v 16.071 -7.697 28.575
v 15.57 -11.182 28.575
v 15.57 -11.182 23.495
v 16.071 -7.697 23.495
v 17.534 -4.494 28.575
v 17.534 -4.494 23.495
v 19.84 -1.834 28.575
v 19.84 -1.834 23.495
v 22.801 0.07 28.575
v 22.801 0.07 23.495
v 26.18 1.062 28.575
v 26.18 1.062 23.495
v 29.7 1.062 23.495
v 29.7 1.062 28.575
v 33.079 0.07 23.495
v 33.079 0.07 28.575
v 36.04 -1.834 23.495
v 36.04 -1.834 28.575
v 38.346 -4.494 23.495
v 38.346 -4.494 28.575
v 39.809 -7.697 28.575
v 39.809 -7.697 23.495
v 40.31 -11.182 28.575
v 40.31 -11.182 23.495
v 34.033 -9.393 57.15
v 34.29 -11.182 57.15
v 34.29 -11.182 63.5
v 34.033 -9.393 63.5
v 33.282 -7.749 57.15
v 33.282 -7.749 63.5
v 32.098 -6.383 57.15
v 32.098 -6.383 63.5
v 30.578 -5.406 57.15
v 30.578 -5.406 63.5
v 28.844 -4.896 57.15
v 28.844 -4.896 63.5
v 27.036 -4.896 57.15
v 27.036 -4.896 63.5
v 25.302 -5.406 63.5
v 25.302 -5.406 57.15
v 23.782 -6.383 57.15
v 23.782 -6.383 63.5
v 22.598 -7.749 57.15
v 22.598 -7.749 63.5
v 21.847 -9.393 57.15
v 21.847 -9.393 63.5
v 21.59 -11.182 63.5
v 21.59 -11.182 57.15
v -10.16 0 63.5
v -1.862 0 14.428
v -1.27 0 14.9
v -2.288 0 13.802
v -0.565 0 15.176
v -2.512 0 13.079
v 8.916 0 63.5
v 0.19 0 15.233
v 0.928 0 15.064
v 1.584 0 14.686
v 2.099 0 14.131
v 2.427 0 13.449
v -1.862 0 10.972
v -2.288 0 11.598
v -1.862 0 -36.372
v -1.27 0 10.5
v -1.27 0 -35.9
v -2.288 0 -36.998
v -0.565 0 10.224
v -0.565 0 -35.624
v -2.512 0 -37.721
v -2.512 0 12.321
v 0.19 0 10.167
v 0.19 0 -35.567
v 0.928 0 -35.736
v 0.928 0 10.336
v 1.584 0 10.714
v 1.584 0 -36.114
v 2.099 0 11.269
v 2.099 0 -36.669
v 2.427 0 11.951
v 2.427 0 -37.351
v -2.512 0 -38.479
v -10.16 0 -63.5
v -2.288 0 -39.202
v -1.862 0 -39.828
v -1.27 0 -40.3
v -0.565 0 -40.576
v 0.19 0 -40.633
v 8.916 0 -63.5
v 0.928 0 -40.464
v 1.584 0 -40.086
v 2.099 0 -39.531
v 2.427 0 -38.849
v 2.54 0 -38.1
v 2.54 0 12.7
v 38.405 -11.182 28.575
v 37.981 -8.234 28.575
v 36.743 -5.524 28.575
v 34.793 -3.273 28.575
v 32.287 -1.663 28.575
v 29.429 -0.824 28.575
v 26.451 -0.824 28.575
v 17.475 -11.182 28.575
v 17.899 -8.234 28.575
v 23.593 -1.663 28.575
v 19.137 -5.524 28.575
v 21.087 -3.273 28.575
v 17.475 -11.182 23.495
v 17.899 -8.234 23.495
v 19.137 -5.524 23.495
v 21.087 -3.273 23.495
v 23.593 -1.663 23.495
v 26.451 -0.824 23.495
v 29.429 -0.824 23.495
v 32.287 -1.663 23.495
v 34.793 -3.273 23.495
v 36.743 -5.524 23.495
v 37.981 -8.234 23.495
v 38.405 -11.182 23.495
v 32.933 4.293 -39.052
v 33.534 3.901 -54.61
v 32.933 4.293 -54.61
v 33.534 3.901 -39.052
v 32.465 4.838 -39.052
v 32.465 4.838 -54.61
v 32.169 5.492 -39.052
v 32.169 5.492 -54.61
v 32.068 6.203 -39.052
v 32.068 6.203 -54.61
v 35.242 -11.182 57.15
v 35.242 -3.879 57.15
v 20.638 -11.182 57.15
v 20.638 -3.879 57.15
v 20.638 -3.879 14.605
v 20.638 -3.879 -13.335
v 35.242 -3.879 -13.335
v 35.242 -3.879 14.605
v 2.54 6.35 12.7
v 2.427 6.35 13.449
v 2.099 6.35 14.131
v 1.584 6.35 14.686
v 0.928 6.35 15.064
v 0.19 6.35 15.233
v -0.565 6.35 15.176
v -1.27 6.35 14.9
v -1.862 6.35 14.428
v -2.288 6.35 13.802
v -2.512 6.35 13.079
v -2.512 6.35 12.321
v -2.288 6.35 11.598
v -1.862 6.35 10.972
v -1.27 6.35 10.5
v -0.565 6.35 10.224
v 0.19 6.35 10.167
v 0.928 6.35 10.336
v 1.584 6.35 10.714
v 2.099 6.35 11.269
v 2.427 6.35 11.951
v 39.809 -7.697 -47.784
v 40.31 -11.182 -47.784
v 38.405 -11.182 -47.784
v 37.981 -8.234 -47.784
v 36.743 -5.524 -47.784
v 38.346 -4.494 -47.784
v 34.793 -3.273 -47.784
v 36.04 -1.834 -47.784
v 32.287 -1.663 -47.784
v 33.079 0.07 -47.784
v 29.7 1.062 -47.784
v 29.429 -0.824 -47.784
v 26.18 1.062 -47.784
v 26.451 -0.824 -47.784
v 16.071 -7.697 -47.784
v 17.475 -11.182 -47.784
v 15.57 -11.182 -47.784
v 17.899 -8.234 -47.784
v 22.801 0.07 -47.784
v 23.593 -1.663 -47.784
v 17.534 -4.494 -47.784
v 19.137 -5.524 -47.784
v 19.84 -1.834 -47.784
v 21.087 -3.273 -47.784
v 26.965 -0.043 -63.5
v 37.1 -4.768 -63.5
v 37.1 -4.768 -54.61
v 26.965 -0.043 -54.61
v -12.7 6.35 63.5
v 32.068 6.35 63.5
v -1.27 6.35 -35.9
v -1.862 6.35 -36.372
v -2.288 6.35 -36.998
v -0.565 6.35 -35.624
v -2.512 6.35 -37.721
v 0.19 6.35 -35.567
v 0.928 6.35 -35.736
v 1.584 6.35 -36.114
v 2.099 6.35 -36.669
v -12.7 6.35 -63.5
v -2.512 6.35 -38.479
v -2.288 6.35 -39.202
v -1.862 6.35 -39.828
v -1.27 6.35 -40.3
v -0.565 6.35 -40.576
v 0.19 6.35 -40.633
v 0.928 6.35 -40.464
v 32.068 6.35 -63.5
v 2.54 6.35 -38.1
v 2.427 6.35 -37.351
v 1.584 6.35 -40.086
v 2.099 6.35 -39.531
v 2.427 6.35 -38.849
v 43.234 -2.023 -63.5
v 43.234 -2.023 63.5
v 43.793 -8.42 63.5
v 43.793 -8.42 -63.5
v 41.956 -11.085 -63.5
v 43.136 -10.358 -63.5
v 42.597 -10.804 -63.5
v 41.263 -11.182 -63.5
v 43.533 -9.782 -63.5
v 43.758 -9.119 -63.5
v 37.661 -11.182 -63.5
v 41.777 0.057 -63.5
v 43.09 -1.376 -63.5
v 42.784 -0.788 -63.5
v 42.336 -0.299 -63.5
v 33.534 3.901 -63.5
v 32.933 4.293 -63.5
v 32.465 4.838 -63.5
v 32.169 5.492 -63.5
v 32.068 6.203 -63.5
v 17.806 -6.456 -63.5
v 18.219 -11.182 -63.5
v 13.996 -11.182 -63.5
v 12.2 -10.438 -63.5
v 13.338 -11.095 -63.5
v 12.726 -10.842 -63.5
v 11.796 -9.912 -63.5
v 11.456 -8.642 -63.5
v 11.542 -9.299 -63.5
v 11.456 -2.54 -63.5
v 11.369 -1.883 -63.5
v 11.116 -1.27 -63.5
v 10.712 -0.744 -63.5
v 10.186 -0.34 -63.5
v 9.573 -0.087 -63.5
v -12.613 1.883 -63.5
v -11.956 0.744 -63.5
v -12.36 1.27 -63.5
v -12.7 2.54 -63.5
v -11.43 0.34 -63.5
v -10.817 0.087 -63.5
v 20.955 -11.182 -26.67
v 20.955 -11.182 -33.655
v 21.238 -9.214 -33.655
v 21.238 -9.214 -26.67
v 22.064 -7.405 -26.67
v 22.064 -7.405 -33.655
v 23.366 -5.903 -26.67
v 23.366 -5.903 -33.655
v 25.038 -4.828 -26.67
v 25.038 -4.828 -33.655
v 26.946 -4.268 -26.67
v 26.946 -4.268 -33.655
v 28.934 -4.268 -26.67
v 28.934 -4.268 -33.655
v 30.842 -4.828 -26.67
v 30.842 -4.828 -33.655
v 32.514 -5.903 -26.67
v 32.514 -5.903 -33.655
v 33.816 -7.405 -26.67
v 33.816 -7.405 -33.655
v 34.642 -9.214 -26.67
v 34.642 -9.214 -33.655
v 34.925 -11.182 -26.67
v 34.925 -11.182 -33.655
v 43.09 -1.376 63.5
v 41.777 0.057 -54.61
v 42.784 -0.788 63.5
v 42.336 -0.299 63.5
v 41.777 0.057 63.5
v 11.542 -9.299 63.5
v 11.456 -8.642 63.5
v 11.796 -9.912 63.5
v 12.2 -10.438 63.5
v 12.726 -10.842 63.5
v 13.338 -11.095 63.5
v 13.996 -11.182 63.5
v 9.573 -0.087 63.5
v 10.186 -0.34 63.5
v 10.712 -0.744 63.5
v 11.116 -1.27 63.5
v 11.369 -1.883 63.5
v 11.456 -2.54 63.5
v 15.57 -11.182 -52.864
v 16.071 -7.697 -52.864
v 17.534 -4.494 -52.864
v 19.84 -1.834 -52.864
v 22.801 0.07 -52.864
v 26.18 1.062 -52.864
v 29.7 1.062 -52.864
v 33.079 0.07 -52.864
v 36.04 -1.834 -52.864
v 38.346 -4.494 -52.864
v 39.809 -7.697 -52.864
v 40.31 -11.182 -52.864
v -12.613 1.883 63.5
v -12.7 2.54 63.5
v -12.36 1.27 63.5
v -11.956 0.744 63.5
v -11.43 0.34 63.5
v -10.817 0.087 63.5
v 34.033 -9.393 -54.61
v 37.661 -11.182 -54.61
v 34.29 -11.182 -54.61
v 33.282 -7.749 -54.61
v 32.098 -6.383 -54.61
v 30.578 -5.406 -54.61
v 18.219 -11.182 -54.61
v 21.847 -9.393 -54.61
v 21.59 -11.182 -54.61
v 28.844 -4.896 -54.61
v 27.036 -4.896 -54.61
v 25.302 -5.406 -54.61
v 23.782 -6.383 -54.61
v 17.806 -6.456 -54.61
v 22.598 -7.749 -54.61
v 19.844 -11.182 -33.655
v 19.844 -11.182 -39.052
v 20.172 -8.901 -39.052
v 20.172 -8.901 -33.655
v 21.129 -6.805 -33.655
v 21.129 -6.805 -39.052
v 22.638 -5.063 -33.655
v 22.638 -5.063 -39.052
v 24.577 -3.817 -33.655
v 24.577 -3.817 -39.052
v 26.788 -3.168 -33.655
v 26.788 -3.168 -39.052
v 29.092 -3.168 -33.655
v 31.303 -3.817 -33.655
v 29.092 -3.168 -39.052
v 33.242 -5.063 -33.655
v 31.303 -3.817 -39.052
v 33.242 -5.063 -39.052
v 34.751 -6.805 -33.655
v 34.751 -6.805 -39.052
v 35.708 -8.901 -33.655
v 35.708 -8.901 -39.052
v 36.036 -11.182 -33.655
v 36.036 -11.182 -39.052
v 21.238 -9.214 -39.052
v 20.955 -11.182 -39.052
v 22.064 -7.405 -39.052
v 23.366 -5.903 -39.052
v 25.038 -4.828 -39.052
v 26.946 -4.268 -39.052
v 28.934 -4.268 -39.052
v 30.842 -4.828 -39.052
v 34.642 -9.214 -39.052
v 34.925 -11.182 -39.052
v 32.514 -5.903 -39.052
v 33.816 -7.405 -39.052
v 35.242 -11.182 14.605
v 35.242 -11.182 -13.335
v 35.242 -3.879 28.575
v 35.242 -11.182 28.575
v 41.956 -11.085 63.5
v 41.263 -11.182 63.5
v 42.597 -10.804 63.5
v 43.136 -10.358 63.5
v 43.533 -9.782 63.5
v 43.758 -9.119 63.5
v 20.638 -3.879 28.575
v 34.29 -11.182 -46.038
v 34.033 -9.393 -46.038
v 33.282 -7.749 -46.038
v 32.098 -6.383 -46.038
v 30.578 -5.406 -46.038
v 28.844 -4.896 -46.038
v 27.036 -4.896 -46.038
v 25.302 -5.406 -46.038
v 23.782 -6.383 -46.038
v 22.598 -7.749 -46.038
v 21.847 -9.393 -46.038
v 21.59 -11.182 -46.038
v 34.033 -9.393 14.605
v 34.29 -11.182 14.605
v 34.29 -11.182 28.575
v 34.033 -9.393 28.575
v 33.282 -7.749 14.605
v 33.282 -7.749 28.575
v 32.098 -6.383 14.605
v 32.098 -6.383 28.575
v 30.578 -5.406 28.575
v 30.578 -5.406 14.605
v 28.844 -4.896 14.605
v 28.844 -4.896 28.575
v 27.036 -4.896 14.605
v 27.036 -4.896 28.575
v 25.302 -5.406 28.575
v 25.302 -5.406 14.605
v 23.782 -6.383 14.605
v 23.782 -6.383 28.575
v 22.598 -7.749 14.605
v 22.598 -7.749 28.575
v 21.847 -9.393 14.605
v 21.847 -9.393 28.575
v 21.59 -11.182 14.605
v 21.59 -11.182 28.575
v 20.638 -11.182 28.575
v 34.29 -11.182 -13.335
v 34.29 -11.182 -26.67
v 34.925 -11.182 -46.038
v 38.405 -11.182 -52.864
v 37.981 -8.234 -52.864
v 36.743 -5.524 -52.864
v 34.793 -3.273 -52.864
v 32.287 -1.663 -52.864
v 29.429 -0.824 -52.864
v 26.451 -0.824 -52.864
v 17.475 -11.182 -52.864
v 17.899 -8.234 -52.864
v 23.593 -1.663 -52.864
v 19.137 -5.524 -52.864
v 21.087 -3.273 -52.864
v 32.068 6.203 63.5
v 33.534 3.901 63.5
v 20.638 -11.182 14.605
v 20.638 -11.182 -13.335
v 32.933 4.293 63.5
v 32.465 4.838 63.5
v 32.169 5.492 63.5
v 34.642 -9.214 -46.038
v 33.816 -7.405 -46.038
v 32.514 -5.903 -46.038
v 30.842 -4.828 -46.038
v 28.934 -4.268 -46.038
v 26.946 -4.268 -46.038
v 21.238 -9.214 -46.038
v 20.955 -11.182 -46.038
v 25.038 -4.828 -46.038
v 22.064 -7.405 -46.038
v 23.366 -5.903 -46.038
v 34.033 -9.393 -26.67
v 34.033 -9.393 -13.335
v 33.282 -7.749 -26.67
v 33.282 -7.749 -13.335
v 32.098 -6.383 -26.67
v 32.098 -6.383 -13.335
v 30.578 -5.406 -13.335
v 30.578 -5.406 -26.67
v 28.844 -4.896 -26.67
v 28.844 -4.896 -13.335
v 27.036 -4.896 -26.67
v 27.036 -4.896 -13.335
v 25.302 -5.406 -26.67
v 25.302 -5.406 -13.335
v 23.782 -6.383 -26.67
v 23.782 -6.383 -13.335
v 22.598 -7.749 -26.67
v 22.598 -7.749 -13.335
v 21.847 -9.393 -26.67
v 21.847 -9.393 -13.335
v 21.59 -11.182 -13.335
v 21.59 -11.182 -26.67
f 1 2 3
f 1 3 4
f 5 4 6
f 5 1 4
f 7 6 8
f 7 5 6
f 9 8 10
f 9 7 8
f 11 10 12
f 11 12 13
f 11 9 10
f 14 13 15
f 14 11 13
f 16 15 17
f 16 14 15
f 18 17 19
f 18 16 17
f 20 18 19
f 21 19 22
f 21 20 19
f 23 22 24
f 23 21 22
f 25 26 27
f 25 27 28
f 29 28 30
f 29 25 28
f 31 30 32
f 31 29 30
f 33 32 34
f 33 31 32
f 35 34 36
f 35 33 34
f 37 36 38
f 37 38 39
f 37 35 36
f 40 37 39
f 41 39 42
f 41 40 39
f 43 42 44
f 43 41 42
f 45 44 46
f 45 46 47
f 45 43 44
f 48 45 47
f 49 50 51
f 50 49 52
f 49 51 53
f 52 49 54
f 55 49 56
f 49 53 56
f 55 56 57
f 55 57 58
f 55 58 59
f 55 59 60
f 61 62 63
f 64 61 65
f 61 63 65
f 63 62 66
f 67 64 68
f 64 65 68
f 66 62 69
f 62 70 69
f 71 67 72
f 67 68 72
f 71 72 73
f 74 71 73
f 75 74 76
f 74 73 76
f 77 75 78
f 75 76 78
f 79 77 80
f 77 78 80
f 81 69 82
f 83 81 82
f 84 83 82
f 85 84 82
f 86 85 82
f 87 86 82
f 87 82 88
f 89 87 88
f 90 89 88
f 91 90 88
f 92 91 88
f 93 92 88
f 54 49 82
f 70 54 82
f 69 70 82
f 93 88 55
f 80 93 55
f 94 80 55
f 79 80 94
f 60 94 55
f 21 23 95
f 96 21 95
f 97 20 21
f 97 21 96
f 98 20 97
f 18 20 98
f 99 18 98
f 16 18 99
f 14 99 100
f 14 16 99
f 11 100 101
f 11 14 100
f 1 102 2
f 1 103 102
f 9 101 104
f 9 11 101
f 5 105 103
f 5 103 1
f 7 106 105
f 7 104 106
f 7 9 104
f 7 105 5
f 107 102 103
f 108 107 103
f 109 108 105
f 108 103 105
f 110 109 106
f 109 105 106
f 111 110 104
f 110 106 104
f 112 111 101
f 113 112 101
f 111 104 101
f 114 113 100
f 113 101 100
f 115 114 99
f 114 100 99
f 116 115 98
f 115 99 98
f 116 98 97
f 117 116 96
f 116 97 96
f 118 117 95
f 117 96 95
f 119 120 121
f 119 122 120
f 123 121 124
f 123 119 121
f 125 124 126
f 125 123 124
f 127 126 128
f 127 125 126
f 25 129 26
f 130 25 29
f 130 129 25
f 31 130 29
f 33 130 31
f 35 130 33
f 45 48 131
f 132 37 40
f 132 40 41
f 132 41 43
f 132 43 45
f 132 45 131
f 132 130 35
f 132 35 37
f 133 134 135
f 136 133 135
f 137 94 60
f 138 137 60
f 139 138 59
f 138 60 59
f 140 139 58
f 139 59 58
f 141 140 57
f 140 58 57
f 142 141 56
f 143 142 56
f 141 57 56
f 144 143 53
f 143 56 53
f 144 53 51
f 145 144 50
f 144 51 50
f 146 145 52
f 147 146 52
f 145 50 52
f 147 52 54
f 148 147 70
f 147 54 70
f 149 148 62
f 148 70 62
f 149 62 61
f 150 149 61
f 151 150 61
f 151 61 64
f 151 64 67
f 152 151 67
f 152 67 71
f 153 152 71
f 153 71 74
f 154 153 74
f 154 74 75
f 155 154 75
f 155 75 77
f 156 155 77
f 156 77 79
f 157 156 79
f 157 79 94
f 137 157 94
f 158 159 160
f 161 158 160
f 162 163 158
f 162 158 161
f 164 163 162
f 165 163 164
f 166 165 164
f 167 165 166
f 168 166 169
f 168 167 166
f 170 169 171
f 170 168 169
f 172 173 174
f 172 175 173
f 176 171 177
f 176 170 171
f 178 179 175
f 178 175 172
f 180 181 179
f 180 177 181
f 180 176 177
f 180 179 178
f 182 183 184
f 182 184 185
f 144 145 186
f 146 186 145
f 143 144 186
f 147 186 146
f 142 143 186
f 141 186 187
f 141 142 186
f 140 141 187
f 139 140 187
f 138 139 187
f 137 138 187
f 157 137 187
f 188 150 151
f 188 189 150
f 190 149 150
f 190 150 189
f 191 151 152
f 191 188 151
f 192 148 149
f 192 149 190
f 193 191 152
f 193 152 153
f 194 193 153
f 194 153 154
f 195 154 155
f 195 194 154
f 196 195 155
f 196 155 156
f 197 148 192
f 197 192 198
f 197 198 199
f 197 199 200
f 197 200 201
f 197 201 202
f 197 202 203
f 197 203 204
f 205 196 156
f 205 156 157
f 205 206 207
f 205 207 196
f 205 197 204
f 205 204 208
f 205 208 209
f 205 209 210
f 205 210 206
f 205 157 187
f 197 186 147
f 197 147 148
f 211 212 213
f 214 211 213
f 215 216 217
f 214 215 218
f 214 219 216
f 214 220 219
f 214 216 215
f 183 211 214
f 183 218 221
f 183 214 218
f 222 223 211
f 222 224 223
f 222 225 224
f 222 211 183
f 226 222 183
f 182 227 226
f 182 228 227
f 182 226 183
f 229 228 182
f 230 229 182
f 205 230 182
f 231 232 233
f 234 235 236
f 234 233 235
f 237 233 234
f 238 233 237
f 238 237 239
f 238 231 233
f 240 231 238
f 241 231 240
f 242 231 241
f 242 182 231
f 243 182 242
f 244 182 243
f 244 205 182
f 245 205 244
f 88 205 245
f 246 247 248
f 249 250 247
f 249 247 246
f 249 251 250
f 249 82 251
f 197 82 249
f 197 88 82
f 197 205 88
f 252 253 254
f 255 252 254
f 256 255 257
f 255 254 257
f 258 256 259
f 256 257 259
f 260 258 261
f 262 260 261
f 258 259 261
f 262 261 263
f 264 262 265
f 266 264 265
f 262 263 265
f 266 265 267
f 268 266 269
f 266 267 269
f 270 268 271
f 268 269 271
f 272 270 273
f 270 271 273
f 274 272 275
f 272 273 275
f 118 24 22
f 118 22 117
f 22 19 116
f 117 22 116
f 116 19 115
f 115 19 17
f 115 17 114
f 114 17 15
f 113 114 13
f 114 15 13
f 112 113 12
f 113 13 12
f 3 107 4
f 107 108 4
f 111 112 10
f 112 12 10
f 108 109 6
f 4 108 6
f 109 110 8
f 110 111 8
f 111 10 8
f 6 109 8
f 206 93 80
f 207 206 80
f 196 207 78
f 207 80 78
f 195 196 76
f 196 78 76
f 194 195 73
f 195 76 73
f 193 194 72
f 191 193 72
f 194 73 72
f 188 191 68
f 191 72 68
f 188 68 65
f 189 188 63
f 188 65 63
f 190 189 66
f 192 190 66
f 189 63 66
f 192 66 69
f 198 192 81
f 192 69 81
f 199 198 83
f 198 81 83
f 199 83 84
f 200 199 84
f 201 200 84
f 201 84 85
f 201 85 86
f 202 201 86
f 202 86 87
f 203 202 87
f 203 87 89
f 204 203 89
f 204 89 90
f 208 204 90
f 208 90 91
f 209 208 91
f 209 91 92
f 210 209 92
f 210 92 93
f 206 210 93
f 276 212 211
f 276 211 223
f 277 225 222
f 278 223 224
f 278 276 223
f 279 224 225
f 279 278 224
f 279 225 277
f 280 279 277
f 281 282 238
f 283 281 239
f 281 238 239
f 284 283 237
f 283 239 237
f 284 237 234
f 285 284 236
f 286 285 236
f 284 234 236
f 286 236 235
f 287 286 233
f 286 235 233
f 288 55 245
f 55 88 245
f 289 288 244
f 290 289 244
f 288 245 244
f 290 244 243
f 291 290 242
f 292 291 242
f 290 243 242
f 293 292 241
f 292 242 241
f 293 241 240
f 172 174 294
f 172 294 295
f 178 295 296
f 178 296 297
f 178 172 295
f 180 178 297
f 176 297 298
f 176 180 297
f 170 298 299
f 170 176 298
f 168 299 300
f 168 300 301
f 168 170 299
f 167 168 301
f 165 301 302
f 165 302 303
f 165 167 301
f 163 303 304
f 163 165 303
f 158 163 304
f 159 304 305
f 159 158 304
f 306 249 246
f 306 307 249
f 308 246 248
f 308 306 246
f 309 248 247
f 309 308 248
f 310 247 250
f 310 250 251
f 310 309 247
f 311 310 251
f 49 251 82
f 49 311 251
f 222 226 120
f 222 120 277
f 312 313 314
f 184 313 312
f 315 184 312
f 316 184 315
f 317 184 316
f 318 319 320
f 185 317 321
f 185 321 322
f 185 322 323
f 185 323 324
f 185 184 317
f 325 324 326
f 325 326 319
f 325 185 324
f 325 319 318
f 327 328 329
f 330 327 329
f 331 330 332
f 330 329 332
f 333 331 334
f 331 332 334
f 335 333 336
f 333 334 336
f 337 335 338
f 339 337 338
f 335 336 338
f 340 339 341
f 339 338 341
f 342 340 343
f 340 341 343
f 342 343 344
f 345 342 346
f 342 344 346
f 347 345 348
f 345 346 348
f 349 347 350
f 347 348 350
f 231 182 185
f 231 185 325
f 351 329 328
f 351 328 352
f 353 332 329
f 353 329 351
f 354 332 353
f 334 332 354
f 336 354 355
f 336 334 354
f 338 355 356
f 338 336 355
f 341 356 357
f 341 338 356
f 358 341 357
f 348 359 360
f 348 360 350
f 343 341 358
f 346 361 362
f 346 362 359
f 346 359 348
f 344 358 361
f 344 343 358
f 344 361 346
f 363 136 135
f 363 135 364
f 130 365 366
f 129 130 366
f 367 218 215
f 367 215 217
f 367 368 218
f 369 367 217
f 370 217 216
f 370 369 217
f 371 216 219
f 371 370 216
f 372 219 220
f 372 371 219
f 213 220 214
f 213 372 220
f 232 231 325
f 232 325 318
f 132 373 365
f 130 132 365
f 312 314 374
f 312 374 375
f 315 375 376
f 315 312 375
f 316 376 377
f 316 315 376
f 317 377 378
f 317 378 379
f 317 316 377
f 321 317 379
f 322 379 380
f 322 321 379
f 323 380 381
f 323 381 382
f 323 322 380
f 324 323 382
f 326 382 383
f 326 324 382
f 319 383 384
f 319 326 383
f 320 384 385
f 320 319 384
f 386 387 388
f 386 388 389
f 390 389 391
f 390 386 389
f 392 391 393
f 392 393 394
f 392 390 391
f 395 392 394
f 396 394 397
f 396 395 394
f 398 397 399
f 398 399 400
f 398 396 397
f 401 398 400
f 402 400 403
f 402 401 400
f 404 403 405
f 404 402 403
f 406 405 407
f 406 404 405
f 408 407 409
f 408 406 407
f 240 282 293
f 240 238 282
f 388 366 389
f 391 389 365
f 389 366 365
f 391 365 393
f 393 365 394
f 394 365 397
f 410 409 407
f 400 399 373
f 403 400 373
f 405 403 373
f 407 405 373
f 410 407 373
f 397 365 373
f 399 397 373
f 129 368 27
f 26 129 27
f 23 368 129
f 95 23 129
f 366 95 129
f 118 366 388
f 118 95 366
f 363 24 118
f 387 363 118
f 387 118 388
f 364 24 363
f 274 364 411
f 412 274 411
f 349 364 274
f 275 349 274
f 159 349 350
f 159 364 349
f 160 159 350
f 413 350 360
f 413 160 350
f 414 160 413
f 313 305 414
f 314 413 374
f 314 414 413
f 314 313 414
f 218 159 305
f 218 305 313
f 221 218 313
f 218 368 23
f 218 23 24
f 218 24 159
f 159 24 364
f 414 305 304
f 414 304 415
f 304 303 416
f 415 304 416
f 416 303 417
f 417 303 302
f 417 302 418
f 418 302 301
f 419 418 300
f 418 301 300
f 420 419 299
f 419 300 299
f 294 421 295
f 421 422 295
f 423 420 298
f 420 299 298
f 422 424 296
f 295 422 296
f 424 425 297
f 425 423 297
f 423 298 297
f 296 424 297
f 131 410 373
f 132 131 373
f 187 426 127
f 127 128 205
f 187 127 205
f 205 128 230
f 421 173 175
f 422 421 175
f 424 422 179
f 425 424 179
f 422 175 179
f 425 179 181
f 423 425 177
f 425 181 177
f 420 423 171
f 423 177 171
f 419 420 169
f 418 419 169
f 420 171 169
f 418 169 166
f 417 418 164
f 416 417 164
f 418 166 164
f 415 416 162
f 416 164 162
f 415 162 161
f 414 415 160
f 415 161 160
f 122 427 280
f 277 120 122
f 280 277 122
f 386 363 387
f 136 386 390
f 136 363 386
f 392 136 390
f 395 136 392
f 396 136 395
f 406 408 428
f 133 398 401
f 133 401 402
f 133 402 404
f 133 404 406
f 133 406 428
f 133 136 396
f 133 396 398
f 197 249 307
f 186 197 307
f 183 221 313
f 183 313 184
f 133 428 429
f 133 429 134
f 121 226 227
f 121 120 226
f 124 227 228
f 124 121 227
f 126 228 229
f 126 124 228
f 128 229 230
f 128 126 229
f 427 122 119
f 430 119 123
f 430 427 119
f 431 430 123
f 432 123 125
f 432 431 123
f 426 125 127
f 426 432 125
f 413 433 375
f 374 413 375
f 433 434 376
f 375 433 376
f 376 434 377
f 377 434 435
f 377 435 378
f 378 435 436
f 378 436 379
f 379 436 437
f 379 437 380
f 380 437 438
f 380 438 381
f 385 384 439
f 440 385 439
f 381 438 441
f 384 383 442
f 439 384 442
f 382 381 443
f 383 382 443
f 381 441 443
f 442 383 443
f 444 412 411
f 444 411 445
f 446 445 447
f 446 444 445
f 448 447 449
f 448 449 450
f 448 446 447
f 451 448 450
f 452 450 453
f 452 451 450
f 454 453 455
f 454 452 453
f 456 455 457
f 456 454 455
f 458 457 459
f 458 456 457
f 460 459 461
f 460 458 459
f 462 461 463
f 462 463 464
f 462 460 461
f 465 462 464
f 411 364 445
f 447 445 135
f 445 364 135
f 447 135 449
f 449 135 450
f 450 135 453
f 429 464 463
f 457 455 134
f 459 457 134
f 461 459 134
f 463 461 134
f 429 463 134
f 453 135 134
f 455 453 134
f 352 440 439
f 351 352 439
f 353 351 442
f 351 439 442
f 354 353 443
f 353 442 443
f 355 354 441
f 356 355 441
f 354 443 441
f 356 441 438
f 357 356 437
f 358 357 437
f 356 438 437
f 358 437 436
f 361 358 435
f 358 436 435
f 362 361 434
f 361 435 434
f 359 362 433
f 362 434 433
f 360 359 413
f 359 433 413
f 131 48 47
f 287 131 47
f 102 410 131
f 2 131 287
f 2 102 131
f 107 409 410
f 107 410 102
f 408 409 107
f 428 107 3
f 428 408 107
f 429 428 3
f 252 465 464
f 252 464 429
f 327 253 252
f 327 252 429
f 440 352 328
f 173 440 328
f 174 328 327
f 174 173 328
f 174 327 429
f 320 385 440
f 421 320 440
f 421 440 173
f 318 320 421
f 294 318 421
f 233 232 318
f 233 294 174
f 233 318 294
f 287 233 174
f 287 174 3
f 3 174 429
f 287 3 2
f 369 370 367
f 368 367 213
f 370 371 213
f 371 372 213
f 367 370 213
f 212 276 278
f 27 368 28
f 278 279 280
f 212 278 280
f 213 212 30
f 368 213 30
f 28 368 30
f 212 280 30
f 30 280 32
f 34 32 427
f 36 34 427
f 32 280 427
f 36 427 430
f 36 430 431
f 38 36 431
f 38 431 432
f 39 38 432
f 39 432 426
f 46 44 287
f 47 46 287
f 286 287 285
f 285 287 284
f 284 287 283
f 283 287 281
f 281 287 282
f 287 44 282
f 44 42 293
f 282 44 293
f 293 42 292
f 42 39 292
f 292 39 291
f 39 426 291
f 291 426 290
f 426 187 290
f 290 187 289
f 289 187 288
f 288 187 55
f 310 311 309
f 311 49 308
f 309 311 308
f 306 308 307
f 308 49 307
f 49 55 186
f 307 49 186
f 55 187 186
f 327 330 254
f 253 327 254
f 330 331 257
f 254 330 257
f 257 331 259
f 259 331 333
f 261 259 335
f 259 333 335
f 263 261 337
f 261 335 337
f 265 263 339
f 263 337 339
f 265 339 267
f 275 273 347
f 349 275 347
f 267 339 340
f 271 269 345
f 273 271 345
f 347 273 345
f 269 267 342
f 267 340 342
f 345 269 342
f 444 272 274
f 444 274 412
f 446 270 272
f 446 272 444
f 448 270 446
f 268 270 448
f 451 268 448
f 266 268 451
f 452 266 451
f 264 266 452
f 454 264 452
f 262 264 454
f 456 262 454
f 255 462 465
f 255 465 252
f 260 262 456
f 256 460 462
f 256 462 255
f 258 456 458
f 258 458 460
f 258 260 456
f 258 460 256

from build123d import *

# Parameters (mm, degrees)
SKETCH1_W            = 64.135
SKETCH1_H            = 127
BOSS_EXTRUDE1_DEPTH  = 6.35
BOSS_EXTRUDE13_DEPTH = 8.89
BOSS_EXTRUDE14_DEPTH = 8.5725
BOSS_EXTRUDE15_DEPTH = 6.985
BOSS_EXTRUDE16_DEPTH = 5.3975
BOSS_EXTRUDE17_START = 12.3825
BOSS_EXTRUDE17_DEPTH = 6.985
BOSS_EXTRUDE18_START = 27.94
BOSS_EXTRUDE18_DEPTH = 13.335
BOSS_EXTRUDE19_DEPTH = 27.94
BOSS_EXTRUDE20_START = 69.215
BOSS_EXTRUDE20_DEPTH = 13.97
BOSS_EXTRUDE21_START = 41.91
BOSS_EXTRUDE21_DEPTH = 28.575
BOSS_EXTRUDE22_START = 111.76
BOSS_EXTRUDE22_DEPTH = 6.35
SKETCH18_R           = 2.54
SKETCH18_W           = 19.3675
SKETCH18_H           = 127
CUT_EXTRUDE5_DEPTH   = 7.35
SKETCH20_W           = 1.905
SKETCH20_H           = 5.08
FILLET3_R            = 2.54


with BuildPart() as part:
    # Sketch1 → Boss-Extrude1 (new body)
    with BuildSketch(Plane(origin=(0, 0, 0), x_dir=(1, 0, 0), z_dir=(0, 1, 0))):
        Rectangle(SKETCH1_W, SKETCH1_H)
    extrude(amount=BOSS_EXTRUDE1_DEPTH)

    # Sketch12 → Boss-Extrude13 (add)
    with BuildSketch(Plane(origin=(0, 0, -63.5), x_dir=(-1, 0, 0), z_dir=(0, 0, -1))):
        Polygon((-37.660740352, -11.181831339), (-37.09962, -4.768196367), (-26.965439184, -0.042550244), (-17.805819185, -6.456185215), (-18.219259648, -11.181831339), (-11.455819185, -11.181831339), (-11.455819185, 6.35), (-28.281950999, 6.35), (-43.105928196, -0.562534091), (-44.03499632, -11.181831339), align=None)
    extrude(amount=-BOSS_EXTRUDE13_DEPTH)

    # Sketch13 → Boss-Extrude14 (add)
    with BuildSketch(Plane.XY.offset(-54.61)):
        with BuildLine():
            Line((44.03499632, -11.181831339), (34.29, -11.181831339))
            ThreePointArc((34.29, -11.181831339), (27.94, -4.831831339), (21.59, -11.181831339))
            Line((21.59, -11.181831339), (11.455819185, -11.181831339))
            Line((11.455819185, -11.181831339), (11.455819185, 0))
            Line((11.455819185, 0), (32.0675, 0))
            Line((32.0675, 0), (32.0675, 4.584769511))
            Line((32.0675, 4.584769511), (43.105928196, -0.562534091))
            Line((43.105928196, -0.562534091), (44.03499632, -11.181831339))
        make_face()
    extrude(amount=BOSS_EXTRUDE14_DEPTH)

    # Sketch14 → Boss-Extrude15 (add)
    with BuildSketch(Plane.XY.offset(-46.0375)):
        with BuildLine():
            Line((34.925, -11.181831339), (44.03499632, -11.181831339))
            Line((44.03499632, -11.181831339), (43.105928196, -0.562534091))
            Line((43.105928196, -0.562534091), (32.0675, 4.584769511))
            Line((32.0675, 4.584769511), (32.0675, 0))
            Line((32.0675, 0), (11.455819185, 0))
            Line((11.455819185, 0), (11.455819185, -11.181831339))
            Line((11.455819185, -11.181831339), (20.955, -11.181831339))
            ThreePointArc((20.955, -11.181831339), (27.94, -4.196831339), (34.925, -11.181831339))
        make_face()
    extrude(amount=BOSS_EXTRUDE15_DEPTH)

    # Sketch15 → Boss-Extrude16 (add)
    with BuildSketch(Plane.XY.offset(-39.0525)):
        with BuildLine():
            Line((36.03625, -11.181831339), (44.03499632, -11.181831339))
            Line((44.03499632, -11.181831339), (43.105928196, -0.562534091))
            Line((43.105928196, -0.562534091), (32.0675, 4.584769511))
            Line((32.0675, 4.584769511), (32.0675, 0))
            Line((32.0675, 0), (11.455819185, 0))
            Line((11.455819185, 0), (11.455819185, -11.181831339))
            Line((11.455819185, -11.181831339), (19.84375, -11.181831339))
            ThreePointArc((19.84375, -11.181831339), (27.94, -3.085581339), (36.03625, -11.181831339))
        make_face()
    extrude(amount=BOSS_EXTRUDE16_DEPTH)

    # Sketch14_2 → Boss-Extrude17 (add)
    with BuildSketch(Plane.XY.offset(-46.0375).offset(BOSS_EXTRUDE17_START)):
        with BuildLine():
            Line((34.925, -11.181831339), (44.03499632, -11.181831339))
            Line((44.03499632, -11.181831339), (43.105928196, -0.562534091))
            Line((43.105928196, -0.562534091), (32.0675, 4.584769511))
            Line((32.0675, 4.584769511), (32.0675, 0))
            Line((32.0675, 0), (11.455819185, 0))
            Line((11.455819185, 0), (11.455819185, -11.181831339))
            Line((11.455819185, -11.181831339), (20.955, -11.181831339))
            ThreePointArc((20.955, -11.181831339), (27.94, -4.196831339), (34.925, -11.181831339))
        make_face()
    extrude(amount=BOSS_EXTRUDE17_DEPTH)

    # Sketch13_2 → Boss-Extrude18 (add)
    with BuildSketch(Plane.XY.offset(-54.61).offset(BOSS_EXTRUDE18_START)):
        with BuildLine():
            Line((44.03499632, -11.181831339), (34.29, -11.181831339))
            ThreePointArc((34.29, -11.181831339), (27.94, -4.831831339), (21.59, -11.181831339))
            Line((21.59, -11.181831339), (11.455819185, -11.181831339))
            Line((11.455819185, -11.181831339), (11.455819185, 0))
            Line((11.455819185, 0), (32.0675, 0))
            Line((32.0675, 0), (32.0675, 4.584769511))
            Line((32.0675, 4.584769511), (43.105928196, -0.562534091))
            Line((43.105928196, -0.562534091), (44.03499632, -11.181831339))
        make_face()
    extrude(amount=BOSS_EXTRUDE18_DEPTH)

    # Sketch16 → Boss-Extrude19 (add)
    with BuildSketch(Plane.XY.offset(-13.335)):
        Polygon((20.6375, -11.181831339), (20.6375, -3.879331339), (35.2425, -3.879331339), (35.2425, -11.181831339), (44.03499632, -11.181831339), (43.105928196, -0.562534091), (32.0675, 4.584769511), (32.0675, 0), (11.455819185, 0), (11.455819185, -11.181831339), align=None)
    extrude(amount=BOSS_EXTRUDE19_DEPTH)

    # Sketch13_3 → Boss-Extrude20 (add)
    with BuildSketch(Plane.XY.offset(-54.61).offset(BOSS_EXTRUDE20_START)):
        with BuildLine():
            Line((44.03499632, -11.181831339), (34.29, -11.181831339))
            ThreePointArc((34.29, -11.181831339), (27.94, -4.831831339), (21.59, -11.181831339))
            Line((21.59, -11.181831339), (11.455819185, -11.181831339))
            Line((11.455819185, -11.181831339), (11.455819185, 0))
            Line((11.455819185, 0), (32.0675, 0))
            Line((32.0675, 0), (32.0675, 4.584769511))
            Line((32.0675, 4.584769511), (43.105928196, -0.562534091))
            Line((43.105928196, -0.562534091), (44.03499632, -11.181831339))
        make_face()
    extrude(amount=BOSS_EXTRUDE20_DEPTH)

    # Sketch16_2 → Boss-Extrude21 (add)
    with BuildSketch(Plane.XY.offset(-13.335).offset(BOSS_EXTRUDE21_START)):
        Polygon((20.6375, -11.181831339), (20.6375, -3.879331339), (35.2425, -3.879331339), (35.2425, -11.181831339), (44.03499632, -11.181831339), (43.105928196, -0.562534091), (32.0675, 4.584769511), (32.0675, 0), (11.455819185, 0), (11.455819185, -11.181831339), align=None)
    extrude(amount=BOSS_EXTRUDE21_DEPTH)

    # Sketch13_4 → Boss-Extrude22 (add)
    with BuildSketch(Plane.XY.offset(-54.61).offset(BOSS_EXTRUDE22_START)):
        with BuildLine():
            Line((44.03499632, -11.181831339), (34.29, -11.181831339))
            ThreePointArc((34.29, -11.181831339), (27.94, -4.831831339), (21.59, -11.181831339))
            Line((21.59, -11.181831339), (11.455819185, -11.181831339))
            Line((11.455819185, -11.181831339), (11.455819185, 0))
            Line((11.455819185, 0), (32.0675, 0))
            Line((32.0675, 0), (32.0675, 4.584769511))
            Line((32.0675, 4.584769511), (43.105928196, -0.562534091))
            Line((43.105928196, -0.562534091), (44.03499632, -11.181831339))
        make_face()
    extrude(amount=BOSS_EXTRUDE22_DEPTH)

    # Sketch18 → Cut-Extrude5 (cut, through all)
    with BuildSketch(Plane.XZ):
        with Locations((0, 12.7)):
            Circle(SKETCH18_R)
        with Locations((0, -38.1)):
            Circle(SKETCH18_R)
        with Locations((-22.38375, 0)):
            Rectangle(SKETCH18_W, SKETCH18_H)
    extrude(amount=-CUT_EXTRUDE5_DEPTH, mode=Mode.SUBTRACT)

    # Sketch20 → Cut-Revolve1 (revolve, cut)
    with BuildSketch(Plane.XZ.offset(11.181831339)):
        with Locations((16.522909592, -50.32375)):
            Rectangle(SKETCH20_W, SKETCH20_H)
        with Locations((16.522909592, 26.035)):
            Rectangle(SKETCH20_W, SKETCH20_H)
    revolve(axis=Axis((27.94, -11.181831339, 63.5), (0, 0, -1)), mode=Mode.SUBTRACT)

    # Fillet3
    fillet3_edges = [part.edges().sort_by_distance(p)[0] for p in [
        (11.455819185, 0, 0),
        (43.105928196, -0.562534091, 0),
        (44.03499632, -11.181831339, 0),
        (32.0675, 4.584769511, 0),
        (11.455819185, -11.181831339, 0),
        (-12.7, 0, 0),
    ]]
    fillet(fillet3_edges, radius=FILLET3_R)


solid = part.part
